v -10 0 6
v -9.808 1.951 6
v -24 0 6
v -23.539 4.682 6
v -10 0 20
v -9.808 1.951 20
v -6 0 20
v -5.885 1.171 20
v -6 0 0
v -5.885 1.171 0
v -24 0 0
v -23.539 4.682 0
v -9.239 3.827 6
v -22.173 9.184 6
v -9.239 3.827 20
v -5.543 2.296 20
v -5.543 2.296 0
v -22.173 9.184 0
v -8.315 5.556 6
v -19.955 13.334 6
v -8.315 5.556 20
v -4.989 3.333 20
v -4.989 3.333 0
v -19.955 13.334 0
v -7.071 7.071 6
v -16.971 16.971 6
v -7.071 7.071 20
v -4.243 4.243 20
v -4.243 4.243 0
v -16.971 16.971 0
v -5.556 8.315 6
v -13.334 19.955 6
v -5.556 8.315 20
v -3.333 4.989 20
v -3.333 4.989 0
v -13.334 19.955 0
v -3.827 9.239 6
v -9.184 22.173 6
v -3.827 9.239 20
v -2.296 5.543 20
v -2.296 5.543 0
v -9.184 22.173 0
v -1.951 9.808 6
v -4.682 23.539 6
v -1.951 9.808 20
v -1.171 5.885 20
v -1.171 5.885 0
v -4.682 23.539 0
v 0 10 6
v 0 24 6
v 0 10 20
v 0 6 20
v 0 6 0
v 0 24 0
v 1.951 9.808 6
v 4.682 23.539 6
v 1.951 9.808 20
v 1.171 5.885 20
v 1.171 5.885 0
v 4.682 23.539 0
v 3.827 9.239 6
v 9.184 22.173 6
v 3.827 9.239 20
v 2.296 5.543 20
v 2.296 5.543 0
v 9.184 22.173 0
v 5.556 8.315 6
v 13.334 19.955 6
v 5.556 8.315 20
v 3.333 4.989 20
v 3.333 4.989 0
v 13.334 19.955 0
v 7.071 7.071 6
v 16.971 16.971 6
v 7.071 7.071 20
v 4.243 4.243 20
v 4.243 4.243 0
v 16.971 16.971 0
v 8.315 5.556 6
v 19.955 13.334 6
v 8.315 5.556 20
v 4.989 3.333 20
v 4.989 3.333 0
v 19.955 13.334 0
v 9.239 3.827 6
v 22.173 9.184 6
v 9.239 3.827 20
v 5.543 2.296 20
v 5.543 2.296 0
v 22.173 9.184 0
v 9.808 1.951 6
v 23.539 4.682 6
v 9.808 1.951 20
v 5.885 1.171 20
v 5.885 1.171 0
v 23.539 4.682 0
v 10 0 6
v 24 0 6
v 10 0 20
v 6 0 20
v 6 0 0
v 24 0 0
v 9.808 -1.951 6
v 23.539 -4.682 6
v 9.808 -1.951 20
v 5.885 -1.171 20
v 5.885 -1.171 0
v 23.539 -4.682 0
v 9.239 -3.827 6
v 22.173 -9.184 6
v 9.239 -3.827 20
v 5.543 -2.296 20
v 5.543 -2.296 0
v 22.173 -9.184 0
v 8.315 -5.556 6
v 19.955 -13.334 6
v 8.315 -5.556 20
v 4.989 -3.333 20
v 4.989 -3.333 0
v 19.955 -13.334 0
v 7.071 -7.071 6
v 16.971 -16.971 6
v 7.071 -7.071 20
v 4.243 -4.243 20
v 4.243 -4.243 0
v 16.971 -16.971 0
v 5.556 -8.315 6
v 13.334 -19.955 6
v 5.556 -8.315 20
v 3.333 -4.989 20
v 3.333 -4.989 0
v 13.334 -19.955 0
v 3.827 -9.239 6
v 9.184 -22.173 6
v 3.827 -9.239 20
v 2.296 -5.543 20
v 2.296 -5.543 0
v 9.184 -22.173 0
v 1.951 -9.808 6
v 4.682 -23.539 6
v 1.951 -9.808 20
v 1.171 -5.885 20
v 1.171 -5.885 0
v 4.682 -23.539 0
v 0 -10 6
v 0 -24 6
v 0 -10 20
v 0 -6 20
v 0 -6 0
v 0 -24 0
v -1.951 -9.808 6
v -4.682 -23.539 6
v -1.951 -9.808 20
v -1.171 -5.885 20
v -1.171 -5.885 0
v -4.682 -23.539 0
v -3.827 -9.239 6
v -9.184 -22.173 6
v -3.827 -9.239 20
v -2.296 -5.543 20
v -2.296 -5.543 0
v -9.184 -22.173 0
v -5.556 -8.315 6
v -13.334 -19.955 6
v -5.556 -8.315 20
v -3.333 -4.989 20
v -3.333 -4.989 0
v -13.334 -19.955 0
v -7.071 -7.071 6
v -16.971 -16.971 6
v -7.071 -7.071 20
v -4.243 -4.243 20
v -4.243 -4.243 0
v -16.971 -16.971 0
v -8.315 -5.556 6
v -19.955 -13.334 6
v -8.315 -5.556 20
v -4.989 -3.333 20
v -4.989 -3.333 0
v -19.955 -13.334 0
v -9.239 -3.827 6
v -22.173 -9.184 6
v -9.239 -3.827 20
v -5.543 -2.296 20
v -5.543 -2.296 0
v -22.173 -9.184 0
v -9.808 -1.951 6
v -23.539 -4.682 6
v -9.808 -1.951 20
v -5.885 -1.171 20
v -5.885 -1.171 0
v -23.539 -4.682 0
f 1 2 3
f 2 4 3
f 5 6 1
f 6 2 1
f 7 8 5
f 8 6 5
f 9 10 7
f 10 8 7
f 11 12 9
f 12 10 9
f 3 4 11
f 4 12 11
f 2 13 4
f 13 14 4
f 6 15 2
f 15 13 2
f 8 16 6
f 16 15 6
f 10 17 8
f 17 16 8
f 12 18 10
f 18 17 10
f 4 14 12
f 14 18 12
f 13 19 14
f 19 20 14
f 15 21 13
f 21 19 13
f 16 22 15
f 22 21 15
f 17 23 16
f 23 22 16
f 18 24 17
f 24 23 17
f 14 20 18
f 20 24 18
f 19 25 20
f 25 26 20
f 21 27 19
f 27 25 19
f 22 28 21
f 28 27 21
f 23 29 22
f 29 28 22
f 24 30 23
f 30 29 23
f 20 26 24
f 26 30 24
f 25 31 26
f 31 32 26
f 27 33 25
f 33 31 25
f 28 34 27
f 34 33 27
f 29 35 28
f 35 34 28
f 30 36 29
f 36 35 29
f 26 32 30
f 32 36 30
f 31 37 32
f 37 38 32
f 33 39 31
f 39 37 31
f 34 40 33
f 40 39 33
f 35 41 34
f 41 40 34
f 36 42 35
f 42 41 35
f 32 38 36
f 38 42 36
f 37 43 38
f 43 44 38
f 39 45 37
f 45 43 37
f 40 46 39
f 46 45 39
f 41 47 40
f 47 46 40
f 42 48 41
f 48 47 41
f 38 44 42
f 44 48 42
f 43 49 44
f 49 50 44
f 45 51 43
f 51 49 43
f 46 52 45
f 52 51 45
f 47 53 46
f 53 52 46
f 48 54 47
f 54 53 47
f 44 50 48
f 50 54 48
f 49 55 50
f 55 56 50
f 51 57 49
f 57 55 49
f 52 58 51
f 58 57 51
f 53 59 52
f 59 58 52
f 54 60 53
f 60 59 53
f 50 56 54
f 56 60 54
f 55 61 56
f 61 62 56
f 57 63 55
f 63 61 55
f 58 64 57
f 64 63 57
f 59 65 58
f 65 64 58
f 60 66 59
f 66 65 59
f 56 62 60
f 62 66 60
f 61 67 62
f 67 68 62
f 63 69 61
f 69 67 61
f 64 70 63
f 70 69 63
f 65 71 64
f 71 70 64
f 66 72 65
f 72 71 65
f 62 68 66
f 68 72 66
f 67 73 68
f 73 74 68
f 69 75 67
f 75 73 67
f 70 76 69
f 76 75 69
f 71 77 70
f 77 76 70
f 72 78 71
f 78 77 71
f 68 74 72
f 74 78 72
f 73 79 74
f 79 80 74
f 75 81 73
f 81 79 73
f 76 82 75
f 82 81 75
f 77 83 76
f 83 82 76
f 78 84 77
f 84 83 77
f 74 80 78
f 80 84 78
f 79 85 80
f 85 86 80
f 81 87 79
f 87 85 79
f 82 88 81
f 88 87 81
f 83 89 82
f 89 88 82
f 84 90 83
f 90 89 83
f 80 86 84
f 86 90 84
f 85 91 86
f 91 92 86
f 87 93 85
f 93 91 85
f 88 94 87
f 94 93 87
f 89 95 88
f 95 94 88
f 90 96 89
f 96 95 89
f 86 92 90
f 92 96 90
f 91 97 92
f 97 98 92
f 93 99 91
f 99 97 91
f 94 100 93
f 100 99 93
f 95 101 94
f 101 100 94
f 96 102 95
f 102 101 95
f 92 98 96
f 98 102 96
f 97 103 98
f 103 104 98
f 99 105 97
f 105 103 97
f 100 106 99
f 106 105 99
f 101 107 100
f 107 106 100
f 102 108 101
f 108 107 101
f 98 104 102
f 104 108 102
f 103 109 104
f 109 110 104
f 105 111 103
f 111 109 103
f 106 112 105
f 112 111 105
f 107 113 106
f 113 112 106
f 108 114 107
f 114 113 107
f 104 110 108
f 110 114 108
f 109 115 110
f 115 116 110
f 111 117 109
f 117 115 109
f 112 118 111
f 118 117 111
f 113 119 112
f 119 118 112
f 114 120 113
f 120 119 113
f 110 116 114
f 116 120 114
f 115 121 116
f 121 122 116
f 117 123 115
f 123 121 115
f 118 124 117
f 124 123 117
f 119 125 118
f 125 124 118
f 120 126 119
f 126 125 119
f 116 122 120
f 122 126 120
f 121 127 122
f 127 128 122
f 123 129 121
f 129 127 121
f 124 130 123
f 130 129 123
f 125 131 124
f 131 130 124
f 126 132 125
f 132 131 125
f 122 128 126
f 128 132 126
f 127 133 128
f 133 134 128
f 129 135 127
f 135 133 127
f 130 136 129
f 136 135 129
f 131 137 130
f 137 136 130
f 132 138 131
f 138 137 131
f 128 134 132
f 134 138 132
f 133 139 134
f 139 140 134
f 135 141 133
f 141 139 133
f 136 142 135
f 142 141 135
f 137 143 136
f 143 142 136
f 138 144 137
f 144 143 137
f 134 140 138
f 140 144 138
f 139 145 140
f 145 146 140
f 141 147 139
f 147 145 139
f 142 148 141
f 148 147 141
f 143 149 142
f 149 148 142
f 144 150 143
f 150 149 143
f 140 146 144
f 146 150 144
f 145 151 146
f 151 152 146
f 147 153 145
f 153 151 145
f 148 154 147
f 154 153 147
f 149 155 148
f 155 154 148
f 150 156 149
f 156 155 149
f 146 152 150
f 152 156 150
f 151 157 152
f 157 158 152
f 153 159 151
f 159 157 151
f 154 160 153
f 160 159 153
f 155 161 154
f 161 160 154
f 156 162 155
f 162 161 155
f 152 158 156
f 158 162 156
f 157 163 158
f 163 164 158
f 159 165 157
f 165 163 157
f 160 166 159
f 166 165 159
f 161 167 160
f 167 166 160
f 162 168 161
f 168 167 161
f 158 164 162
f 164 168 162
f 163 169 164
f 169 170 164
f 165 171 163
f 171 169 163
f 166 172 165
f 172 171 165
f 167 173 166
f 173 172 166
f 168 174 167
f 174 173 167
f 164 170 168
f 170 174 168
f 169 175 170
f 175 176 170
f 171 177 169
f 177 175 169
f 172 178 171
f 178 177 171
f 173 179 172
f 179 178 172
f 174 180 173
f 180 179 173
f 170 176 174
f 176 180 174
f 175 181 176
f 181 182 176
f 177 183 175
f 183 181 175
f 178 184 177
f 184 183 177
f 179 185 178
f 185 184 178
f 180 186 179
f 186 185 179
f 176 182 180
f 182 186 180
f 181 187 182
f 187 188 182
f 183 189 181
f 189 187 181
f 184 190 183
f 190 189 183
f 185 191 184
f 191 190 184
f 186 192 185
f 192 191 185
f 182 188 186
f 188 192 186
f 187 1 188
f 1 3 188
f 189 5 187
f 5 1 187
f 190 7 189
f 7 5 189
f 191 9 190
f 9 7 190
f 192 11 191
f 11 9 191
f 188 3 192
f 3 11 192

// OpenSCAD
$fn = 32;

// ----------------------------------------------------------------------
// Revolved part: flanged bushing R24
// ----------------------------------------------------------------------

// --- parameters (mm) ---
bore_r = 6;               // bore radius
flange_r = 24;            // flange radius
flange_h = 6;             // flange thickness
sleeve_r = 10;            // sleeve radius
total_h = 20;             // overall height
revolve_angle = 360;      // revolve sweep, degrees
fit_tol = 0.05;           // declared fit tolerance (prompt contract)
free_tol = 0.3;           // declared free tolerance (prompt contract)

bore_d = 2 * bore_r;
flange_d = 2 * flange_r;
sleeve_d = 2 * sleeve_r;

profile = [[6, 0], [24, 0], [24, 6], [10, 6], [10, 20], [6, 20]];  // primary outline, 6 points, counter clockwise

// --- the one profile operation ---
rotate_extrude(angle = revolve_angle) polygon(points = profile);
